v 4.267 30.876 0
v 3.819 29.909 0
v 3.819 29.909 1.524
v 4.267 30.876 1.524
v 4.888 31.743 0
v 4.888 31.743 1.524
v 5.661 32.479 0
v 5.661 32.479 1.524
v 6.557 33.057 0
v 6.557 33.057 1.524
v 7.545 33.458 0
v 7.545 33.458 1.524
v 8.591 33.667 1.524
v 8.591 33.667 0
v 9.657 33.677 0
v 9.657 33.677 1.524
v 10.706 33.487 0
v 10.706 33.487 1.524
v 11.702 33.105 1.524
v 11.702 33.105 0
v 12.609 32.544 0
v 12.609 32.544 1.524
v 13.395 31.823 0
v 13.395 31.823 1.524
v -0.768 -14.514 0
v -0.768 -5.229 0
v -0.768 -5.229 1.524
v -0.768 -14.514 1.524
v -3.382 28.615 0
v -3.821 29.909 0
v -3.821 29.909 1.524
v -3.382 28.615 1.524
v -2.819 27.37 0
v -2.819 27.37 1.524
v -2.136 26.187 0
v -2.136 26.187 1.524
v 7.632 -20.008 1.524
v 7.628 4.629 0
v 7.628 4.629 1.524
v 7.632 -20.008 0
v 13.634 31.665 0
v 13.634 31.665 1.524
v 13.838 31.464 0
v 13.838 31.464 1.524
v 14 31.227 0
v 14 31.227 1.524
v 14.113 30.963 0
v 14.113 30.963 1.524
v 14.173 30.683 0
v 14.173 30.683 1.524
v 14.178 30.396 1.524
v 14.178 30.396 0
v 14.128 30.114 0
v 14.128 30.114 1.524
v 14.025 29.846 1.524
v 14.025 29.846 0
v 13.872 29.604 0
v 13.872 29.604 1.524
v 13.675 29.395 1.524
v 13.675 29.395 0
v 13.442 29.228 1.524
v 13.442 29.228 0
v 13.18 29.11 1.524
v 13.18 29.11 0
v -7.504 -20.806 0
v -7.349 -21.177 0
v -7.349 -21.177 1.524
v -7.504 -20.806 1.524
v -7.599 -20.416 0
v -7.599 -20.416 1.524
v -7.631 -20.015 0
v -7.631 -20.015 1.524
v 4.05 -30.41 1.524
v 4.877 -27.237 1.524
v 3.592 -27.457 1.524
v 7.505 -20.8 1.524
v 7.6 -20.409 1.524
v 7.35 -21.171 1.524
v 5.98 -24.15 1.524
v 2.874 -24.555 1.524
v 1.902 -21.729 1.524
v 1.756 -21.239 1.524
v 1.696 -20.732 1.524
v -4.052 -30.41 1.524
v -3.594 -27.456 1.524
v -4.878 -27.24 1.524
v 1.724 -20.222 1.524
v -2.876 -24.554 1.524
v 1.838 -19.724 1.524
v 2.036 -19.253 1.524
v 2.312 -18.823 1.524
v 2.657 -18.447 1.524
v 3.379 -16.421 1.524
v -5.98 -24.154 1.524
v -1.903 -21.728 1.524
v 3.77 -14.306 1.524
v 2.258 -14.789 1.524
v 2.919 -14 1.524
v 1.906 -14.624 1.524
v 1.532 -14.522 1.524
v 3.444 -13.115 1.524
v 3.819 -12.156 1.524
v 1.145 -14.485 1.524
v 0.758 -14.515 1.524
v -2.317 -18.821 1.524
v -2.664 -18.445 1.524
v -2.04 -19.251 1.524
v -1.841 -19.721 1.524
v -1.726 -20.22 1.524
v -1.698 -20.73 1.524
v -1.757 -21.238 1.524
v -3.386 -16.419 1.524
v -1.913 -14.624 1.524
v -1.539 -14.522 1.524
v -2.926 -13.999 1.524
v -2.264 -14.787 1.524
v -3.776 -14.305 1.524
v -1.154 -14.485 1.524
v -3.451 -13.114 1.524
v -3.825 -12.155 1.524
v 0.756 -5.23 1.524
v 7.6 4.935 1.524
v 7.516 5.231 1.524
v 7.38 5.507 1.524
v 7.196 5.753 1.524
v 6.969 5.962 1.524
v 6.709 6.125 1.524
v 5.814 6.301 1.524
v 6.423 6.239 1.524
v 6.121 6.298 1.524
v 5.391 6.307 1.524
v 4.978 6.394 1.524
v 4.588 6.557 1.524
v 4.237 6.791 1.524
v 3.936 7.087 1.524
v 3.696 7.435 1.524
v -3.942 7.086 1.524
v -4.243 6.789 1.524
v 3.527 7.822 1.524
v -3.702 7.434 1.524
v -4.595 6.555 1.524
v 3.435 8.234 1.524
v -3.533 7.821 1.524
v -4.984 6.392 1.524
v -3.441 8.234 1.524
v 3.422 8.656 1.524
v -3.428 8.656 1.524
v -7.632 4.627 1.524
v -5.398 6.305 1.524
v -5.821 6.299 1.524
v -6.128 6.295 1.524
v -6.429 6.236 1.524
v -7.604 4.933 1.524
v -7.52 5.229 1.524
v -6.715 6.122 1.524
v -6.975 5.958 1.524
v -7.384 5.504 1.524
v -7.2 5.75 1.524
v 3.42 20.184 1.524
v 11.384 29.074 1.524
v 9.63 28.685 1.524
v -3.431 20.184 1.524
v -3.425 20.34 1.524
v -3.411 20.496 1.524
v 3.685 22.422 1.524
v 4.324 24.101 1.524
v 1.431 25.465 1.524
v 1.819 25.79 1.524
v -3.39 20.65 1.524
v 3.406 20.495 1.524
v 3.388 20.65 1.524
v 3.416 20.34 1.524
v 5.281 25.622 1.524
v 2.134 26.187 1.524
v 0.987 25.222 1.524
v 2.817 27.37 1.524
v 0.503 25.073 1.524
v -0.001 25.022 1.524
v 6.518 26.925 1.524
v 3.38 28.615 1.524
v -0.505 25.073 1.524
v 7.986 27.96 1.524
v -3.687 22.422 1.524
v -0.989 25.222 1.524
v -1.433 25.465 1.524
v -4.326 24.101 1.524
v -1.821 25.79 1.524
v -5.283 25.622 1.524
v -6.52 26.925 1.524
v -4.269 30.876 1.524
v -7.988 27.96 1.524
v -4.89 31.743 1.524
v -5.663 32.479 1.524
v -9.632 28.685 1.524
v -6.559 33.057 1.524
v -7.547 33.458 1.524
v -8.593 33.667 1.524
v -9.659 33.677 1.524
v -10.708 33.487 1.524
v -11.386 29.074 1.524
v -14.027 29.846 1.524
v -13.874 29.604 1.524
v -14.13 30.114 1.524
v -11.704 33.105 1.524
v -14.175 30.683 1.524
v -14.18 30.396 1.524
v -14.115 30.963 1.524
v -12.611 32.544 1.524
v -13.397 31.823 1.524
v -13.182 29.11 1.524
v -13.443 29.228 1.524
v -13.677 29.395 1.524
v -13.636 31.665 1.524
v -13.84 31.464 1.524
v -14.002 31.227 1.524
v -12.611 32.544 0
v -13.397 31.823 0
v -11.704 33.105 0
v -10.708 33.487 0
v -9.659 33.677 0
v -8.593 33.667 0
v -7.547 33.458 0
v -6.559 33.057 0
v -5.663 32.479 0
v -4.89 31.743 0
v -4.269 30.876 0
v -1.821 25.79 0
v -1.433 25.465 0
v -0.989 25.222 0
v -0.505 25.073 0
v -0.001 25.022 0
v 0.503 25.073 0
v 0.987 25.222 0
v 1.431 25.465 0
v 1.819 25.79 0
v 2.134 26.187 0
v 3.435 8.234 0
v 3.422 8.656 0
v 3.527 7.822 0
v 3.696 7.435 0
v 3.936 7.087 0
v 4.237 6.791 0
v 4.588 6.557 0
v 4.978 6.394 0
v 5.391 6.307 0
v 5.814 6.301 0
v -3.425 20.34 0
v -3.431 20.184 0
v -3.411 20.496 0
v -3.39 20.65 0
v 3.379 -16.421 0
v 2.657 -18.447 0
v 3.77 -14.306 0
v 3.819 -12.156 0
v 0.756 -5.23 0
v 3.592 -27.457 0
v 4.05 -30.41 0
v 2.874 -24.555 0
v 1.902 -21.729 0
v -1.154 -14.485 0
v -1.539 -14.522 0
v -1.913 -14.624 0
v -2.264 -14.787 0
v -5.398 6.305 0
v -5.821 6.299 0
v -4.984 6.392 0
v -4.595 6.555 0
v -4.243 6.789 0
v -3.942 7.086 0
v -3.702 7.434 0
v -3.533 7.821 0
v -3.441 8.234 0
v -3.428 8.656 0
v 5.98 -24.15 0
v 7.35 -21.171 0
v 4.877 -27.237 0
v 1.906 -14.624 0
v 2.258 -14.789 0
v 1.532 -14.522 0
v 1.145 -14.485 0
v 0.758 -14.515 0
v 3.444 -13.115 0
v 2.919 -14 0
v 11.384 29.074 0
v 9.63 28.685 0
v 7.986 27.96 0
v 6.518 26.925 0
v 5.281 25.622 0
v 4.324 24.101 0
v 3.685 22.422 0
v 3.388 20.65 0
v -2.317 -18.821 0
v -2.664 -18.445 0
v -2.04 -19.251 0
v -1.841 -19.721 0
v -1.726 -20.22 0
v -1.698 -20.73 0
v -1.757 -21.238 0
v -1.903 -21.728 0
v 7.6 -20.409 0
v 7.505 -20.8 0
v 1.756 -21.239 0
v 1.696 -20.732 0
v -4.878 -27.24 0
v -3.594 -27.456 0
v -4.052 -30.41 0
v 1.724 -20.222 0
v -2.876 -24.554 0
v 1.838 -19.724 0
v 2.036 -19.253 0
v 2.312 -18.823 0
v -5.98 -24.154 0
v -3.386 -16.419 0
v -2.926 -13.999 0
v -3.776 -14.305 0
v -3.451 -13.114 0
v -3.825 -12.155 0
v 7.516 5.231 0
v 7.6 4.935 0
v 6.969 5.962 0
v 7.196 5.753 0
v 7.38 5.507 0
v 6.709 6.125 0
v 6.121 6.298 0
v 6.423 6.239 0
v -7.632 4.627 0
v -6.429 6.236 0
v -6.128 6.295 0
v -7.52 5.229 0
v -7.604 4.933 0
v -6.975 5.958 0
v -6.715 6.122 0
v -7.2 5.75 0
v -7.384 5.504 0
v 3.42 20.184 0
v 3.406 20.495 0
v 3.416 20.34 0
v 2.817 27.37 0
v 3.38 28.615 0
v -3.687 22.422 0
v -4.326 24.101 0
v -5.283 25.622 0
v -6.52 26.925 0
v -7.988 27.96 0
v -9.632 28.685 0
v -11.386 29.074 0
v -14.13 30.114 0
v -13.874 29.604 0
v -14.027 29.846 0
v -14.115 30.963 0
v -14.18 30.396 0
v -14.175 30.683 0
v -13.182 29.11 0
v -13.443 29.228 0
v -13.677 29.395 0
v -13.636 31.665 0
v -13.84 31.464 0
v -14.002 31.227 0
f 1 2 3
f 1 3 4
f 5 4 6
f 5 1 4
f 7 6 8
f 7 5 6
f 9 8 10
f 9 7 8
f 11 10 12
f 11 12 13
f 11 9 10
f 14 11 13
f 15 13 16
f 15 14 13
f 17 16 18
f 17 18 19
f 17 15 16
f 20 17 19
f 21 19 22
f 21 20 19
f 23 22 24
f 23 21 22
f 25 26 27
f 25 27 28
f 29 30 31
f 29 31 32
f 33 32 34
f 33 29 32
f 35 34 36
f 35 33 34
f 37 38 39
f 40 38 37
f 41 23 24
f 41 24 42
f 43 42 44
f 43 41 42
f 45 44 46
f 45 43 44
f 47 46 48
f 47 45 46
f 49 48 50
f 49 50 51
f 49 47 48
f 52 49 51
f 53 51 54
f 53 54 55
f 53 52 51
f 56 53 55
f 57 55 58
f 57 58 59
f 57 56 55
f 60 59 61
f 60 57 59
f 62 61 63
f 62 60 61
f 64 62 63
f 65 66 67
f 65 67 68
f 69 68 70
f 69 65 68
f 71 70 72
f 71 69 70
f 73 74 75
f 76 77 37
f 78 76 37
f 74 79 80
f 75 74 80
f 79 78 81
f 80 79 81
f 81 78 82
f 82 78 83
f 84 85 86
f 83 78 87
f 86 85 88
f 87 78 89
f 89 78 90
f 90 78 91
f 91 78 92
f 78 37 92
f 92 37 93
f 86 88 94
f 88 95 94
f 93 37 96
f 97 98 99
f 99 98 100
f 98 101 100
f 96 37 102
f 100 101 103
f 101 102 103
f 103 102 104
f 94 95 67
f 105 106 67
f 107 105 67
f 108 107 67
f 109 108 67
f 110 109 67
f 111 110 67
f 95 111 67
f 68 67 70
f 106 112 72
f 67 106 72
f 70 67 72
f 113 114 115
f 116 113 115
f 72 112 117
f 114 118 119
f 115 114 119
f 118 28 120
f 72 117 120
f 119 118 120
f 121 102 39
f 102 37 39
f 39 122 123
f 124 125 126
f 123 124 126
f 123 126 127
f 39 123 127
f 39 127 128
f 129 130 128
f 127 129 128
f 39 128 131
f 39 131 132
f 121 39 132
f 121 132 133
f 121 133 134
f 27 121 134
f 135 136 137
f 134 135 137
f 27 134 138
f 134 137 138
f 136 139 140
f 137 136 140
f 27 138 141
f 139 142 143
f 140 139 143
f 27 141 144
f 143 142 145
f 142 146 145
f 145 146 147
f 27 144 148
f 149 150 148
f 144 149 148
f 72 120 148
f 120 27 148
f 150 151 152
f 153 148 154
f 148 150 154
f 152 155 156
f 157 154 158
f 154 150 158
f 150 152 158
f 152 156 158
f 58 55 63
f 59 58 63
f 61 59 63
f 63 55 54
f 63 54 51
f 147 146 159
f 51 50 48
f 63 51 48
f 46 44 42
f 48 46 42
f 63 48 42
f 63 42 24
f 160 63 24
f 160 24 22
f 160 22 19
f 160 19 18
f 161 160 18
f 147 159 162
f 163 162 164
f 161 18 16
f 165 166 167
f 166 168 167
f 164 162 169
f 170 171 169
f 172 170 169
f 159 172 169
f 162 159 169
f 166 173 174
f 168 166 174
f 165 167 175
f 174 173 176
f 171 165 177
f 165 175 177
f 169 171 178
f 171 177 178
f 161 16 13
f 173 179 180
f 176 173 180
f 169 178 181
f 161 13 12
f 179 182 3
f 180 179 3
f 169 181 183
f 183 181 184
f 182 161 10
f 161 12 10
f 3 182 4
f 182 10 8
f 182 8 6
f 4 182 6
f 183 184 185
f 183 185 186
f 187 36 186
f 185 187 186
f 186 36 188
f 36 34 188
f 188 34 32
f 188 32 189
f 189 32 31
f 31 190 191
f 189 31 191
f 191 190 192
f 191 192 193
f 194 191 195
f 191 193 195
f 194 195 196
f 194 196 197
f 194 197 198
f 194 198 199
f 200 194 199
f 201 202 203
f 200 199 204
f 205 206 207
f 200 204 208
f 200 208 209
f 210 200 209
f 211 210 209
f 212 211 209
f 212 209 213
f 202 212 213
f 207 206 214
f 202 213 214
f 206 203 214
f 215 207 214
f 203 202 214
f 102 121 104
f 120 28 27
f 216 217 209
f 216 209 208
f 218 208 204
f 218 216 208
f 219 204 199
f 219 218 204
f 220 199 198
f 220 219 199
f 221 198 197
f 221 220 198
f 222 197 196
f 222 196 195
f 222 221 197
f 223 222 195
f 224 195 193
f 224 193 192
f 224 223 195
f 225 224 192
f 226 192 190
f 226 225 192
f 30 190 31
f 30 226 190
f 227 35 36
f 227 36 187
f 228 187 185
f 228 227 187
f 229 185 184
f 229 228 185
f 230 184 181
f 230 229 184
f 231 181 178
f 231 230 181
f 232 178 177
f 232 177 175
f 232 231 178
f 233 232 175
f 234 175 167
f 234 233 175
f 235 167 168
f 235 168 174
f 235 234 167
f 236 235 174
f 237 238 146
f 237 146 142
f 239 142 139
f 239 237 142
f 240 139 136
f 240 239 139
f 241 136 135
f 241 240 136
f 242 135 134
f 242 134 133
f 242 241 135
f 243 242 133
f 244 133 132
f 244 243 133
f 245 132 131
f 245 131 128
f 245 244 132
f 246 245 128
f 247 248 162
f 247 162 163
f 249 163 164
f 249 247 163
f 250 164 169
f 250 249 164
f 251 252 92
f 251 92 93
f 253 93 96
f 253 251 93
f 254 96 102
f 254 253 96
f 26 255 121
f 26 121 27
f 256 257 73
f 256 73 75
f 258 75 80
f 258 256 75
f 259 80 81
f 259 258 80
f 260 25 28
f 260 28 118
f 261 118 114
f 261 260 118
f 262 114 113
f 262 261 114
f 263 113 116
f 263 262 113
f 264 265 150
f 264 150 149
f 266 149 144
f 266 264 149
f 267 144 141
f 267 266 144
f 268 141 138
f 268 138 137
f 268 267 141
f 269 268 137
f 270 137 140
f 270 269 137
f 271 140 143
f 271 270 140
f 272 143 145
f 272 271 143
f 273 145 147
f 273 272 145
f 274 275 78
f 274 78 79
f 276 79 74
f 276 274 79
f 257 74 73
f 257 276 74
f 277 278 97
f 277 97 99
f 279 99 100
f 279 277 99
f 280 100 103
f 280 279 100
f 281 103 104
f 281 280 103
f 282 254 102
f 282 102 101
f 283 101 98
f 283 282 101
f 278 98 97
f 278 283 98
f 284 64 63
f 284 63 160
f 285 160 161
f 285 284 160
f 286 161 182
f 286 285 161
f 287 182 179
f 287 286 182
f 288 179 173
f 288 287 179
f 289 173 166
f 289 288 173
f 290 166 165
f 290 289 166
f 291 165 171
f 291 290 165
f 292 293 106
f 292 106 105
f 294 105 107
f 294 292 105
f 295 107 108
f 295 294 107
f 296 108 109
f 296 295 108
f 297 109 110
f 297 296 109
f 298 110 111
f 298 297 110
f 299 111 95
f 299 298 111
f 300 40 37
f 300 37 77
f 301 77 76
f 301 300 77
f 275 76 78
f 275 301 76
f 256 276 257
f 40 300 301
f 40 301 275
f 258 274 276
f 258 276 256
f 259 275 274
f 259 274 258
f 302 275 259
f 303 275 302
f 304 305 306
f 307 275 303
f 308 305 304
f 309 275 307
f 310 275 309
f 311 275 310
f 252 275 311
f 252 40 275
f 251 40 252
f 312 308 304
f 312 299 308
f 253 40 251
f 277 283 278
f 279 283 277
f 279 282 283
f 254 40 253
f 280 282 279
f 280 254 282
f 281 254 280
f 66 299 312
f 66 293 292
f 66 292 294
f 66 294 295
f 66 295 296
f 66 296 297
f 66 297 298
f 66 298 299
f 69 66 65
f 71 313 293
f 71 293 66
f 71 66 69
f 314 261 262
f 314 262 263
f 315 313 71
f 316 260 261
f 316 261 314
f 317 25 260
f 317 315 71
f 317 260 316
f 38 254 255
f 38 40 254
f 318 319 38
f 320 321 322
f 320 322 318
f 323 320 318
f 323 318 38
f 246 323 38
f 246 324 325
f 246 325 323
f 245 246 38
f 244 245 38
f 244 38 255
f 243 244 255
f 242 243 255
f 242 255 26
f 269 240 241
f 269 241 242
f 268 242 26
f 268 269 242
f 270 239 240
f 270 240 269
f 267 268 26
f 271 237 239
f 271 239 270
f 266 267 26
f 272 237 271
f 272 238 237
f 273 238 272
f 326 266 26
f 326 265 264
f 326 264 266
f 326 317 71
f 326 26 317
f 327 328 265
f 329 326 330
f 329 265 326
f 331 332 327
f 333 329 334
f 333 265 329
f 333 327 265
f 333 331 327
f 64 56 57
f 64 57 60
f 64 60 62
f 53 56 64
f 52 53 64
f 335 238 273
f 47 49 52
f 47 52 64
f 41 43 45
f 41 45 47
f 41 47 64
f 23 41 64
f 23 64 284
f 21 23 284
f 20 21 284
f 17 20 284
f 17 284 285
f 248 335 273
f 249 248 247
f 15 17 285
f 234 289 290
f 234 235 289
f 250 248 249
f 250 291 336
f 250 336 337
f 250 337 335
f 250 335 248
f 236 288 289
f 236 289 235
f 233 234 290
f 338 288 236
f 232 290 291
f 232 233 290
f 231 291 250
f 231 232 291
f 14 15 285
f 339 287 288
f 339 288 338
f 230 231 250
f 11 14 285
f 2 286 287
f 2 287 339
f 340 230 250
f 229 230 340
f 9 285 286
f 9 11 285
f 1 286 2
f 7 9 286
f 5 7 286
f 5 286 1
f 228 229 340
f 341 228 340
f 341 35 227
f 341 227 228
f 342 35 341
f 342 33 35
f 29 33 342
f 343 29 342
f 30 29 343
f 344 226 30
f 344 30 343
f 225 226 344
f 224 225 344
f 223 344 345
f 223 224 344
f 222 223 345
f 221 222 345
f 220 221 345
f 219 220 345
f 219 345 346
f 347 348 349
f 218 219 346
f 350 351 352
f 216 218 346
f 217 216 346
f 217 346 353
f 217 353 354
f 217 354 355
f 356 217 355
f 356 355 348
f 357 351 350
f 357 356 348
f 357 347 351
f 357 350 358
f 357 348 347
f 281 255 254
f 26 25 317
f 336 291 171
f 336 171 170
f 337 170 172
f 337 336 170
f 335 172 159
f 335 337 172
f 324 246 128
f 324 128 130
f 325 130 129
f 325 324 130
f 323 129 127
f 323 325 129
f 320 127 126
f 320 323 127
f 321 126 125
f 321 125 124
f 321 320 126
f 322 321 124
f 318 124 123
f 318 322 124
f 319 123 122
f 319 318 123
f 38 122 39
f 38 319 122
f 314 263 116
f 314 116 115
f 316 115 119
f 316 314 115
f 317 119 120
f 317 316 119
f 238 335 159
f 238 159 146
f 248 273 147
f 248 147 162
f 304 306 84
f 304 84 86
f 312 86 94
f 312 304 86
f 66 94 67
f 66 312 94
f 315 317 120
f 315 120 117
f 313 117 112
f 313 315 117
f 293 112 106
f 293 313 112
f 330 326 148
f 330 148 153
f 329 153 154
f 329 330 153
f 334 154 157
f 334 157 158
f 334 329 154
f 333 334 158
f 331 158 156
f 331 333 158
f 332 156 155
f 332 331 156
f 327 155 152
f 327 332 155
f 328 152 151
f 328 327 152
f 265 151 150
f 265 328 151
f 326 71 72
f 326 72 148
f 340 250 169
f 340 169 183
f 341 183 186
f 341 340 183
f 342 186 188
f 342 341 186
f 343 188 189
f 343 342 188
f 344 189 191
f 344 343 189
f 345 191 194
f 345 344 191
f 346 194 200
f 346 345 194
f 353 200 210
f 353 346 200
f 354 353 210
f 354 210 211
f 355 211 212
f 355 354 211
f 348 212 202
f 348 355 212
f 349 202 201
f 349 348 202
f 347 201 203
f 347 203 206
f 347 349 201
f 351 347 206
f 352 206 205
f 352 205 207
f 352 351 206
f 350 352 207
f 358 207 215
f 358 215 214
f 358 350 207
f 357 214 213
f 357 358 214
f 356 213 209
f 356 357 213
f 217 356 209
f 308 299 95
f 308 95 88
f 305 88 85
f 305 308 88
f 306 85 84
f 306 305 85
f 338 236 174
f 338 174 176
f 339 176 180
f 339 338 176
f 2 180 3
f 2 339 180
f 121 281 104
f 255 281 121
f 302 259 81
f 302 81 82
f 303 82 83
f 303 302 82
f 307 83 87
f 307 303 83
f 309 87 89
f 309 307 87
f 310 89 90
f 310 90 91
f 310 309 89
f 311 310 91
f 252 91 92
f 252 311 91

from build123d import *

# Parameters (mm, degrees)
BOSS_EXTRUDE1_DEPTH = 1.524


with BuildPart() as part:
    # Sketch1 → Boss-Extrude1 (new body)
    with BuildSketch(Plane.XY):
        with BuildLine():
            Line((0.758413423, -14.514612412), (0.756426596, -5.229573284))
            Line((0.756426596, -5.229573284), (-0.767567777, -5.228579871))
            Line((-0.767567777, -5.228579871), (-0.767567777, -14.513618998))
            ThreePointArc((-0.767567777, -14.513618998), (-1.539192536, -14.521879258), (-2.263766939, -14.78733158))
            ThreePointArc((-2.263766939, -14.78733158), (-3.206305559, -13.566940945), (-3.825331329, -12.1546593))
            ThreePointArc((-3.825331329, -12.1546593), (-3.623089301, -15.369727095), (-2.663937168, -18.445046583))
            ThreePointArc((-2.663937168, -18.445046583), (-1.772934243, -19.968018634), (-1.903339021, -21.727656288))
            ThreePointArc((-1.903339021, -21.727656288), (-3.266929983, -25.997412135), (-4.052166969, -30.410302139))
            ThreePointArc((-4.052166969, -30.410302139), (-5.395158951, -25.68457677), (-7.349213338, -21.177052042))
            ThreePointArc((-7.349213338, -21.177052042), (-7.559215071, -20.612929546), (-7.63057286, -20.015231476))
            Line((-7.63057286, -20.015231476), (-7.631892886, 4.626897175))
            ThreePointArc((-7.631892886, 4.626897175), (-7.092287621, 5.859442088), (-5.820556253, 6.298805414))
            ThreePointArc((-5.820556253, 6.298805414), (-4.085125664, 6.930306858), (-3.428174811, 8.656264268))
            Line((-3.428174811, 8.656264268), (-3.431470931, 20.183759219))
            ThreePointArc((-3.431470931, 20.183759219), (-3.418767766, 20.417805376), (-3.390090239, 20.650435067))
            ThreePointArc((-3.390090239, 20.650435067), (-6.519567928, 26.925166891), (-13.182414969, 29.109739933))
            ThreePointArc((-13.182414969, 29.109739933), (-14.180468361, 30.396049042), (-13.396765315, 31.823112892))
            ThreePointArc((-13.396765315, 31.823112892), (-8.064833076, 33.586641612), (-3.820754211, 29.9086898))
            ThreePointArc((-3.820754211, 29.9086898), (-3.115822585, 27.98554328), (-2.136235135, 26.186702108))
            ThreePointArc((-2.136235135, 26.186702108), (-0.000993472, 25.022326708), (2.134248191, 26.186702108))
            ThreePointArc((2.134248191, 26.186702108), (3.113835641, 27.98554328), (3.818767267, 29.9086898))
            ThreePointArc((3.818767267, 29.9086898), (8.062846132, 33.586641612), (13.394778371, 31.823112892))
            ThreePointArc((13.394778371, 31.823112892), (14.178481417, 30.396049042), (13.180428025, 29.109739933))
            ThreePointArc((13.180428025, 29.109739933), (6.517580984, 26.925166891), (3.388103295, 20.650435067))
            ThreePointArc((3.388103295, 20.650435067), (3.412047002, 20.417632477), (3.420040198, 20.183738364))
            Line((3.420040198, 20.183738364), (3.421535659, 8.656441281))
            ThreePointArc((3.421535659, 8.656441281), (4.079205123, 6.93199833), (5.813550357, 6.300904656))
            ThreePointArc((5.813550357, 6.300904656), (7.087362904, 5.86275757), (7.628225836, 4.6290483))
            Line((7.628225836, 4.6290483), (7.631801236, -20.008478102))
            ThreePointArc((7.631801236, -20.008478102), (7.56045, -20.606653876), (7.350236218, -21.171202742))
            ThreePointArc((7.350236218, -21.171202742), (5.394278235, -25.681479256), (4.050180025, -30.410302139))
            ThreePointArc((4.050180025, -30.410302139), (3.265080471, -25.998057724), (1.901795058, -21.728896802))
            ThreePointArc((1.901795058, -21.728896802), (1.770271466, -19.970622492), (2.657373106, -18.446851614))
            ThreePointArc((2.657373106, -18.446851614), (3.616525238, -15.371532126), (3.818767267, -12.156464331))
            ThreePointArc((3.818767267, -12.156464331), (3.199964786, -13.568369499), (2.257818447, -14.788514159))
            ThreePointArc((2.257818447, -14.788514159), (1.531710448, -14.522401162), (0.758413423, -14.514612412))
        make_face()
    extrude(amount=BOSS_EXTRUDE1_DEPTH)


solid = part.part
